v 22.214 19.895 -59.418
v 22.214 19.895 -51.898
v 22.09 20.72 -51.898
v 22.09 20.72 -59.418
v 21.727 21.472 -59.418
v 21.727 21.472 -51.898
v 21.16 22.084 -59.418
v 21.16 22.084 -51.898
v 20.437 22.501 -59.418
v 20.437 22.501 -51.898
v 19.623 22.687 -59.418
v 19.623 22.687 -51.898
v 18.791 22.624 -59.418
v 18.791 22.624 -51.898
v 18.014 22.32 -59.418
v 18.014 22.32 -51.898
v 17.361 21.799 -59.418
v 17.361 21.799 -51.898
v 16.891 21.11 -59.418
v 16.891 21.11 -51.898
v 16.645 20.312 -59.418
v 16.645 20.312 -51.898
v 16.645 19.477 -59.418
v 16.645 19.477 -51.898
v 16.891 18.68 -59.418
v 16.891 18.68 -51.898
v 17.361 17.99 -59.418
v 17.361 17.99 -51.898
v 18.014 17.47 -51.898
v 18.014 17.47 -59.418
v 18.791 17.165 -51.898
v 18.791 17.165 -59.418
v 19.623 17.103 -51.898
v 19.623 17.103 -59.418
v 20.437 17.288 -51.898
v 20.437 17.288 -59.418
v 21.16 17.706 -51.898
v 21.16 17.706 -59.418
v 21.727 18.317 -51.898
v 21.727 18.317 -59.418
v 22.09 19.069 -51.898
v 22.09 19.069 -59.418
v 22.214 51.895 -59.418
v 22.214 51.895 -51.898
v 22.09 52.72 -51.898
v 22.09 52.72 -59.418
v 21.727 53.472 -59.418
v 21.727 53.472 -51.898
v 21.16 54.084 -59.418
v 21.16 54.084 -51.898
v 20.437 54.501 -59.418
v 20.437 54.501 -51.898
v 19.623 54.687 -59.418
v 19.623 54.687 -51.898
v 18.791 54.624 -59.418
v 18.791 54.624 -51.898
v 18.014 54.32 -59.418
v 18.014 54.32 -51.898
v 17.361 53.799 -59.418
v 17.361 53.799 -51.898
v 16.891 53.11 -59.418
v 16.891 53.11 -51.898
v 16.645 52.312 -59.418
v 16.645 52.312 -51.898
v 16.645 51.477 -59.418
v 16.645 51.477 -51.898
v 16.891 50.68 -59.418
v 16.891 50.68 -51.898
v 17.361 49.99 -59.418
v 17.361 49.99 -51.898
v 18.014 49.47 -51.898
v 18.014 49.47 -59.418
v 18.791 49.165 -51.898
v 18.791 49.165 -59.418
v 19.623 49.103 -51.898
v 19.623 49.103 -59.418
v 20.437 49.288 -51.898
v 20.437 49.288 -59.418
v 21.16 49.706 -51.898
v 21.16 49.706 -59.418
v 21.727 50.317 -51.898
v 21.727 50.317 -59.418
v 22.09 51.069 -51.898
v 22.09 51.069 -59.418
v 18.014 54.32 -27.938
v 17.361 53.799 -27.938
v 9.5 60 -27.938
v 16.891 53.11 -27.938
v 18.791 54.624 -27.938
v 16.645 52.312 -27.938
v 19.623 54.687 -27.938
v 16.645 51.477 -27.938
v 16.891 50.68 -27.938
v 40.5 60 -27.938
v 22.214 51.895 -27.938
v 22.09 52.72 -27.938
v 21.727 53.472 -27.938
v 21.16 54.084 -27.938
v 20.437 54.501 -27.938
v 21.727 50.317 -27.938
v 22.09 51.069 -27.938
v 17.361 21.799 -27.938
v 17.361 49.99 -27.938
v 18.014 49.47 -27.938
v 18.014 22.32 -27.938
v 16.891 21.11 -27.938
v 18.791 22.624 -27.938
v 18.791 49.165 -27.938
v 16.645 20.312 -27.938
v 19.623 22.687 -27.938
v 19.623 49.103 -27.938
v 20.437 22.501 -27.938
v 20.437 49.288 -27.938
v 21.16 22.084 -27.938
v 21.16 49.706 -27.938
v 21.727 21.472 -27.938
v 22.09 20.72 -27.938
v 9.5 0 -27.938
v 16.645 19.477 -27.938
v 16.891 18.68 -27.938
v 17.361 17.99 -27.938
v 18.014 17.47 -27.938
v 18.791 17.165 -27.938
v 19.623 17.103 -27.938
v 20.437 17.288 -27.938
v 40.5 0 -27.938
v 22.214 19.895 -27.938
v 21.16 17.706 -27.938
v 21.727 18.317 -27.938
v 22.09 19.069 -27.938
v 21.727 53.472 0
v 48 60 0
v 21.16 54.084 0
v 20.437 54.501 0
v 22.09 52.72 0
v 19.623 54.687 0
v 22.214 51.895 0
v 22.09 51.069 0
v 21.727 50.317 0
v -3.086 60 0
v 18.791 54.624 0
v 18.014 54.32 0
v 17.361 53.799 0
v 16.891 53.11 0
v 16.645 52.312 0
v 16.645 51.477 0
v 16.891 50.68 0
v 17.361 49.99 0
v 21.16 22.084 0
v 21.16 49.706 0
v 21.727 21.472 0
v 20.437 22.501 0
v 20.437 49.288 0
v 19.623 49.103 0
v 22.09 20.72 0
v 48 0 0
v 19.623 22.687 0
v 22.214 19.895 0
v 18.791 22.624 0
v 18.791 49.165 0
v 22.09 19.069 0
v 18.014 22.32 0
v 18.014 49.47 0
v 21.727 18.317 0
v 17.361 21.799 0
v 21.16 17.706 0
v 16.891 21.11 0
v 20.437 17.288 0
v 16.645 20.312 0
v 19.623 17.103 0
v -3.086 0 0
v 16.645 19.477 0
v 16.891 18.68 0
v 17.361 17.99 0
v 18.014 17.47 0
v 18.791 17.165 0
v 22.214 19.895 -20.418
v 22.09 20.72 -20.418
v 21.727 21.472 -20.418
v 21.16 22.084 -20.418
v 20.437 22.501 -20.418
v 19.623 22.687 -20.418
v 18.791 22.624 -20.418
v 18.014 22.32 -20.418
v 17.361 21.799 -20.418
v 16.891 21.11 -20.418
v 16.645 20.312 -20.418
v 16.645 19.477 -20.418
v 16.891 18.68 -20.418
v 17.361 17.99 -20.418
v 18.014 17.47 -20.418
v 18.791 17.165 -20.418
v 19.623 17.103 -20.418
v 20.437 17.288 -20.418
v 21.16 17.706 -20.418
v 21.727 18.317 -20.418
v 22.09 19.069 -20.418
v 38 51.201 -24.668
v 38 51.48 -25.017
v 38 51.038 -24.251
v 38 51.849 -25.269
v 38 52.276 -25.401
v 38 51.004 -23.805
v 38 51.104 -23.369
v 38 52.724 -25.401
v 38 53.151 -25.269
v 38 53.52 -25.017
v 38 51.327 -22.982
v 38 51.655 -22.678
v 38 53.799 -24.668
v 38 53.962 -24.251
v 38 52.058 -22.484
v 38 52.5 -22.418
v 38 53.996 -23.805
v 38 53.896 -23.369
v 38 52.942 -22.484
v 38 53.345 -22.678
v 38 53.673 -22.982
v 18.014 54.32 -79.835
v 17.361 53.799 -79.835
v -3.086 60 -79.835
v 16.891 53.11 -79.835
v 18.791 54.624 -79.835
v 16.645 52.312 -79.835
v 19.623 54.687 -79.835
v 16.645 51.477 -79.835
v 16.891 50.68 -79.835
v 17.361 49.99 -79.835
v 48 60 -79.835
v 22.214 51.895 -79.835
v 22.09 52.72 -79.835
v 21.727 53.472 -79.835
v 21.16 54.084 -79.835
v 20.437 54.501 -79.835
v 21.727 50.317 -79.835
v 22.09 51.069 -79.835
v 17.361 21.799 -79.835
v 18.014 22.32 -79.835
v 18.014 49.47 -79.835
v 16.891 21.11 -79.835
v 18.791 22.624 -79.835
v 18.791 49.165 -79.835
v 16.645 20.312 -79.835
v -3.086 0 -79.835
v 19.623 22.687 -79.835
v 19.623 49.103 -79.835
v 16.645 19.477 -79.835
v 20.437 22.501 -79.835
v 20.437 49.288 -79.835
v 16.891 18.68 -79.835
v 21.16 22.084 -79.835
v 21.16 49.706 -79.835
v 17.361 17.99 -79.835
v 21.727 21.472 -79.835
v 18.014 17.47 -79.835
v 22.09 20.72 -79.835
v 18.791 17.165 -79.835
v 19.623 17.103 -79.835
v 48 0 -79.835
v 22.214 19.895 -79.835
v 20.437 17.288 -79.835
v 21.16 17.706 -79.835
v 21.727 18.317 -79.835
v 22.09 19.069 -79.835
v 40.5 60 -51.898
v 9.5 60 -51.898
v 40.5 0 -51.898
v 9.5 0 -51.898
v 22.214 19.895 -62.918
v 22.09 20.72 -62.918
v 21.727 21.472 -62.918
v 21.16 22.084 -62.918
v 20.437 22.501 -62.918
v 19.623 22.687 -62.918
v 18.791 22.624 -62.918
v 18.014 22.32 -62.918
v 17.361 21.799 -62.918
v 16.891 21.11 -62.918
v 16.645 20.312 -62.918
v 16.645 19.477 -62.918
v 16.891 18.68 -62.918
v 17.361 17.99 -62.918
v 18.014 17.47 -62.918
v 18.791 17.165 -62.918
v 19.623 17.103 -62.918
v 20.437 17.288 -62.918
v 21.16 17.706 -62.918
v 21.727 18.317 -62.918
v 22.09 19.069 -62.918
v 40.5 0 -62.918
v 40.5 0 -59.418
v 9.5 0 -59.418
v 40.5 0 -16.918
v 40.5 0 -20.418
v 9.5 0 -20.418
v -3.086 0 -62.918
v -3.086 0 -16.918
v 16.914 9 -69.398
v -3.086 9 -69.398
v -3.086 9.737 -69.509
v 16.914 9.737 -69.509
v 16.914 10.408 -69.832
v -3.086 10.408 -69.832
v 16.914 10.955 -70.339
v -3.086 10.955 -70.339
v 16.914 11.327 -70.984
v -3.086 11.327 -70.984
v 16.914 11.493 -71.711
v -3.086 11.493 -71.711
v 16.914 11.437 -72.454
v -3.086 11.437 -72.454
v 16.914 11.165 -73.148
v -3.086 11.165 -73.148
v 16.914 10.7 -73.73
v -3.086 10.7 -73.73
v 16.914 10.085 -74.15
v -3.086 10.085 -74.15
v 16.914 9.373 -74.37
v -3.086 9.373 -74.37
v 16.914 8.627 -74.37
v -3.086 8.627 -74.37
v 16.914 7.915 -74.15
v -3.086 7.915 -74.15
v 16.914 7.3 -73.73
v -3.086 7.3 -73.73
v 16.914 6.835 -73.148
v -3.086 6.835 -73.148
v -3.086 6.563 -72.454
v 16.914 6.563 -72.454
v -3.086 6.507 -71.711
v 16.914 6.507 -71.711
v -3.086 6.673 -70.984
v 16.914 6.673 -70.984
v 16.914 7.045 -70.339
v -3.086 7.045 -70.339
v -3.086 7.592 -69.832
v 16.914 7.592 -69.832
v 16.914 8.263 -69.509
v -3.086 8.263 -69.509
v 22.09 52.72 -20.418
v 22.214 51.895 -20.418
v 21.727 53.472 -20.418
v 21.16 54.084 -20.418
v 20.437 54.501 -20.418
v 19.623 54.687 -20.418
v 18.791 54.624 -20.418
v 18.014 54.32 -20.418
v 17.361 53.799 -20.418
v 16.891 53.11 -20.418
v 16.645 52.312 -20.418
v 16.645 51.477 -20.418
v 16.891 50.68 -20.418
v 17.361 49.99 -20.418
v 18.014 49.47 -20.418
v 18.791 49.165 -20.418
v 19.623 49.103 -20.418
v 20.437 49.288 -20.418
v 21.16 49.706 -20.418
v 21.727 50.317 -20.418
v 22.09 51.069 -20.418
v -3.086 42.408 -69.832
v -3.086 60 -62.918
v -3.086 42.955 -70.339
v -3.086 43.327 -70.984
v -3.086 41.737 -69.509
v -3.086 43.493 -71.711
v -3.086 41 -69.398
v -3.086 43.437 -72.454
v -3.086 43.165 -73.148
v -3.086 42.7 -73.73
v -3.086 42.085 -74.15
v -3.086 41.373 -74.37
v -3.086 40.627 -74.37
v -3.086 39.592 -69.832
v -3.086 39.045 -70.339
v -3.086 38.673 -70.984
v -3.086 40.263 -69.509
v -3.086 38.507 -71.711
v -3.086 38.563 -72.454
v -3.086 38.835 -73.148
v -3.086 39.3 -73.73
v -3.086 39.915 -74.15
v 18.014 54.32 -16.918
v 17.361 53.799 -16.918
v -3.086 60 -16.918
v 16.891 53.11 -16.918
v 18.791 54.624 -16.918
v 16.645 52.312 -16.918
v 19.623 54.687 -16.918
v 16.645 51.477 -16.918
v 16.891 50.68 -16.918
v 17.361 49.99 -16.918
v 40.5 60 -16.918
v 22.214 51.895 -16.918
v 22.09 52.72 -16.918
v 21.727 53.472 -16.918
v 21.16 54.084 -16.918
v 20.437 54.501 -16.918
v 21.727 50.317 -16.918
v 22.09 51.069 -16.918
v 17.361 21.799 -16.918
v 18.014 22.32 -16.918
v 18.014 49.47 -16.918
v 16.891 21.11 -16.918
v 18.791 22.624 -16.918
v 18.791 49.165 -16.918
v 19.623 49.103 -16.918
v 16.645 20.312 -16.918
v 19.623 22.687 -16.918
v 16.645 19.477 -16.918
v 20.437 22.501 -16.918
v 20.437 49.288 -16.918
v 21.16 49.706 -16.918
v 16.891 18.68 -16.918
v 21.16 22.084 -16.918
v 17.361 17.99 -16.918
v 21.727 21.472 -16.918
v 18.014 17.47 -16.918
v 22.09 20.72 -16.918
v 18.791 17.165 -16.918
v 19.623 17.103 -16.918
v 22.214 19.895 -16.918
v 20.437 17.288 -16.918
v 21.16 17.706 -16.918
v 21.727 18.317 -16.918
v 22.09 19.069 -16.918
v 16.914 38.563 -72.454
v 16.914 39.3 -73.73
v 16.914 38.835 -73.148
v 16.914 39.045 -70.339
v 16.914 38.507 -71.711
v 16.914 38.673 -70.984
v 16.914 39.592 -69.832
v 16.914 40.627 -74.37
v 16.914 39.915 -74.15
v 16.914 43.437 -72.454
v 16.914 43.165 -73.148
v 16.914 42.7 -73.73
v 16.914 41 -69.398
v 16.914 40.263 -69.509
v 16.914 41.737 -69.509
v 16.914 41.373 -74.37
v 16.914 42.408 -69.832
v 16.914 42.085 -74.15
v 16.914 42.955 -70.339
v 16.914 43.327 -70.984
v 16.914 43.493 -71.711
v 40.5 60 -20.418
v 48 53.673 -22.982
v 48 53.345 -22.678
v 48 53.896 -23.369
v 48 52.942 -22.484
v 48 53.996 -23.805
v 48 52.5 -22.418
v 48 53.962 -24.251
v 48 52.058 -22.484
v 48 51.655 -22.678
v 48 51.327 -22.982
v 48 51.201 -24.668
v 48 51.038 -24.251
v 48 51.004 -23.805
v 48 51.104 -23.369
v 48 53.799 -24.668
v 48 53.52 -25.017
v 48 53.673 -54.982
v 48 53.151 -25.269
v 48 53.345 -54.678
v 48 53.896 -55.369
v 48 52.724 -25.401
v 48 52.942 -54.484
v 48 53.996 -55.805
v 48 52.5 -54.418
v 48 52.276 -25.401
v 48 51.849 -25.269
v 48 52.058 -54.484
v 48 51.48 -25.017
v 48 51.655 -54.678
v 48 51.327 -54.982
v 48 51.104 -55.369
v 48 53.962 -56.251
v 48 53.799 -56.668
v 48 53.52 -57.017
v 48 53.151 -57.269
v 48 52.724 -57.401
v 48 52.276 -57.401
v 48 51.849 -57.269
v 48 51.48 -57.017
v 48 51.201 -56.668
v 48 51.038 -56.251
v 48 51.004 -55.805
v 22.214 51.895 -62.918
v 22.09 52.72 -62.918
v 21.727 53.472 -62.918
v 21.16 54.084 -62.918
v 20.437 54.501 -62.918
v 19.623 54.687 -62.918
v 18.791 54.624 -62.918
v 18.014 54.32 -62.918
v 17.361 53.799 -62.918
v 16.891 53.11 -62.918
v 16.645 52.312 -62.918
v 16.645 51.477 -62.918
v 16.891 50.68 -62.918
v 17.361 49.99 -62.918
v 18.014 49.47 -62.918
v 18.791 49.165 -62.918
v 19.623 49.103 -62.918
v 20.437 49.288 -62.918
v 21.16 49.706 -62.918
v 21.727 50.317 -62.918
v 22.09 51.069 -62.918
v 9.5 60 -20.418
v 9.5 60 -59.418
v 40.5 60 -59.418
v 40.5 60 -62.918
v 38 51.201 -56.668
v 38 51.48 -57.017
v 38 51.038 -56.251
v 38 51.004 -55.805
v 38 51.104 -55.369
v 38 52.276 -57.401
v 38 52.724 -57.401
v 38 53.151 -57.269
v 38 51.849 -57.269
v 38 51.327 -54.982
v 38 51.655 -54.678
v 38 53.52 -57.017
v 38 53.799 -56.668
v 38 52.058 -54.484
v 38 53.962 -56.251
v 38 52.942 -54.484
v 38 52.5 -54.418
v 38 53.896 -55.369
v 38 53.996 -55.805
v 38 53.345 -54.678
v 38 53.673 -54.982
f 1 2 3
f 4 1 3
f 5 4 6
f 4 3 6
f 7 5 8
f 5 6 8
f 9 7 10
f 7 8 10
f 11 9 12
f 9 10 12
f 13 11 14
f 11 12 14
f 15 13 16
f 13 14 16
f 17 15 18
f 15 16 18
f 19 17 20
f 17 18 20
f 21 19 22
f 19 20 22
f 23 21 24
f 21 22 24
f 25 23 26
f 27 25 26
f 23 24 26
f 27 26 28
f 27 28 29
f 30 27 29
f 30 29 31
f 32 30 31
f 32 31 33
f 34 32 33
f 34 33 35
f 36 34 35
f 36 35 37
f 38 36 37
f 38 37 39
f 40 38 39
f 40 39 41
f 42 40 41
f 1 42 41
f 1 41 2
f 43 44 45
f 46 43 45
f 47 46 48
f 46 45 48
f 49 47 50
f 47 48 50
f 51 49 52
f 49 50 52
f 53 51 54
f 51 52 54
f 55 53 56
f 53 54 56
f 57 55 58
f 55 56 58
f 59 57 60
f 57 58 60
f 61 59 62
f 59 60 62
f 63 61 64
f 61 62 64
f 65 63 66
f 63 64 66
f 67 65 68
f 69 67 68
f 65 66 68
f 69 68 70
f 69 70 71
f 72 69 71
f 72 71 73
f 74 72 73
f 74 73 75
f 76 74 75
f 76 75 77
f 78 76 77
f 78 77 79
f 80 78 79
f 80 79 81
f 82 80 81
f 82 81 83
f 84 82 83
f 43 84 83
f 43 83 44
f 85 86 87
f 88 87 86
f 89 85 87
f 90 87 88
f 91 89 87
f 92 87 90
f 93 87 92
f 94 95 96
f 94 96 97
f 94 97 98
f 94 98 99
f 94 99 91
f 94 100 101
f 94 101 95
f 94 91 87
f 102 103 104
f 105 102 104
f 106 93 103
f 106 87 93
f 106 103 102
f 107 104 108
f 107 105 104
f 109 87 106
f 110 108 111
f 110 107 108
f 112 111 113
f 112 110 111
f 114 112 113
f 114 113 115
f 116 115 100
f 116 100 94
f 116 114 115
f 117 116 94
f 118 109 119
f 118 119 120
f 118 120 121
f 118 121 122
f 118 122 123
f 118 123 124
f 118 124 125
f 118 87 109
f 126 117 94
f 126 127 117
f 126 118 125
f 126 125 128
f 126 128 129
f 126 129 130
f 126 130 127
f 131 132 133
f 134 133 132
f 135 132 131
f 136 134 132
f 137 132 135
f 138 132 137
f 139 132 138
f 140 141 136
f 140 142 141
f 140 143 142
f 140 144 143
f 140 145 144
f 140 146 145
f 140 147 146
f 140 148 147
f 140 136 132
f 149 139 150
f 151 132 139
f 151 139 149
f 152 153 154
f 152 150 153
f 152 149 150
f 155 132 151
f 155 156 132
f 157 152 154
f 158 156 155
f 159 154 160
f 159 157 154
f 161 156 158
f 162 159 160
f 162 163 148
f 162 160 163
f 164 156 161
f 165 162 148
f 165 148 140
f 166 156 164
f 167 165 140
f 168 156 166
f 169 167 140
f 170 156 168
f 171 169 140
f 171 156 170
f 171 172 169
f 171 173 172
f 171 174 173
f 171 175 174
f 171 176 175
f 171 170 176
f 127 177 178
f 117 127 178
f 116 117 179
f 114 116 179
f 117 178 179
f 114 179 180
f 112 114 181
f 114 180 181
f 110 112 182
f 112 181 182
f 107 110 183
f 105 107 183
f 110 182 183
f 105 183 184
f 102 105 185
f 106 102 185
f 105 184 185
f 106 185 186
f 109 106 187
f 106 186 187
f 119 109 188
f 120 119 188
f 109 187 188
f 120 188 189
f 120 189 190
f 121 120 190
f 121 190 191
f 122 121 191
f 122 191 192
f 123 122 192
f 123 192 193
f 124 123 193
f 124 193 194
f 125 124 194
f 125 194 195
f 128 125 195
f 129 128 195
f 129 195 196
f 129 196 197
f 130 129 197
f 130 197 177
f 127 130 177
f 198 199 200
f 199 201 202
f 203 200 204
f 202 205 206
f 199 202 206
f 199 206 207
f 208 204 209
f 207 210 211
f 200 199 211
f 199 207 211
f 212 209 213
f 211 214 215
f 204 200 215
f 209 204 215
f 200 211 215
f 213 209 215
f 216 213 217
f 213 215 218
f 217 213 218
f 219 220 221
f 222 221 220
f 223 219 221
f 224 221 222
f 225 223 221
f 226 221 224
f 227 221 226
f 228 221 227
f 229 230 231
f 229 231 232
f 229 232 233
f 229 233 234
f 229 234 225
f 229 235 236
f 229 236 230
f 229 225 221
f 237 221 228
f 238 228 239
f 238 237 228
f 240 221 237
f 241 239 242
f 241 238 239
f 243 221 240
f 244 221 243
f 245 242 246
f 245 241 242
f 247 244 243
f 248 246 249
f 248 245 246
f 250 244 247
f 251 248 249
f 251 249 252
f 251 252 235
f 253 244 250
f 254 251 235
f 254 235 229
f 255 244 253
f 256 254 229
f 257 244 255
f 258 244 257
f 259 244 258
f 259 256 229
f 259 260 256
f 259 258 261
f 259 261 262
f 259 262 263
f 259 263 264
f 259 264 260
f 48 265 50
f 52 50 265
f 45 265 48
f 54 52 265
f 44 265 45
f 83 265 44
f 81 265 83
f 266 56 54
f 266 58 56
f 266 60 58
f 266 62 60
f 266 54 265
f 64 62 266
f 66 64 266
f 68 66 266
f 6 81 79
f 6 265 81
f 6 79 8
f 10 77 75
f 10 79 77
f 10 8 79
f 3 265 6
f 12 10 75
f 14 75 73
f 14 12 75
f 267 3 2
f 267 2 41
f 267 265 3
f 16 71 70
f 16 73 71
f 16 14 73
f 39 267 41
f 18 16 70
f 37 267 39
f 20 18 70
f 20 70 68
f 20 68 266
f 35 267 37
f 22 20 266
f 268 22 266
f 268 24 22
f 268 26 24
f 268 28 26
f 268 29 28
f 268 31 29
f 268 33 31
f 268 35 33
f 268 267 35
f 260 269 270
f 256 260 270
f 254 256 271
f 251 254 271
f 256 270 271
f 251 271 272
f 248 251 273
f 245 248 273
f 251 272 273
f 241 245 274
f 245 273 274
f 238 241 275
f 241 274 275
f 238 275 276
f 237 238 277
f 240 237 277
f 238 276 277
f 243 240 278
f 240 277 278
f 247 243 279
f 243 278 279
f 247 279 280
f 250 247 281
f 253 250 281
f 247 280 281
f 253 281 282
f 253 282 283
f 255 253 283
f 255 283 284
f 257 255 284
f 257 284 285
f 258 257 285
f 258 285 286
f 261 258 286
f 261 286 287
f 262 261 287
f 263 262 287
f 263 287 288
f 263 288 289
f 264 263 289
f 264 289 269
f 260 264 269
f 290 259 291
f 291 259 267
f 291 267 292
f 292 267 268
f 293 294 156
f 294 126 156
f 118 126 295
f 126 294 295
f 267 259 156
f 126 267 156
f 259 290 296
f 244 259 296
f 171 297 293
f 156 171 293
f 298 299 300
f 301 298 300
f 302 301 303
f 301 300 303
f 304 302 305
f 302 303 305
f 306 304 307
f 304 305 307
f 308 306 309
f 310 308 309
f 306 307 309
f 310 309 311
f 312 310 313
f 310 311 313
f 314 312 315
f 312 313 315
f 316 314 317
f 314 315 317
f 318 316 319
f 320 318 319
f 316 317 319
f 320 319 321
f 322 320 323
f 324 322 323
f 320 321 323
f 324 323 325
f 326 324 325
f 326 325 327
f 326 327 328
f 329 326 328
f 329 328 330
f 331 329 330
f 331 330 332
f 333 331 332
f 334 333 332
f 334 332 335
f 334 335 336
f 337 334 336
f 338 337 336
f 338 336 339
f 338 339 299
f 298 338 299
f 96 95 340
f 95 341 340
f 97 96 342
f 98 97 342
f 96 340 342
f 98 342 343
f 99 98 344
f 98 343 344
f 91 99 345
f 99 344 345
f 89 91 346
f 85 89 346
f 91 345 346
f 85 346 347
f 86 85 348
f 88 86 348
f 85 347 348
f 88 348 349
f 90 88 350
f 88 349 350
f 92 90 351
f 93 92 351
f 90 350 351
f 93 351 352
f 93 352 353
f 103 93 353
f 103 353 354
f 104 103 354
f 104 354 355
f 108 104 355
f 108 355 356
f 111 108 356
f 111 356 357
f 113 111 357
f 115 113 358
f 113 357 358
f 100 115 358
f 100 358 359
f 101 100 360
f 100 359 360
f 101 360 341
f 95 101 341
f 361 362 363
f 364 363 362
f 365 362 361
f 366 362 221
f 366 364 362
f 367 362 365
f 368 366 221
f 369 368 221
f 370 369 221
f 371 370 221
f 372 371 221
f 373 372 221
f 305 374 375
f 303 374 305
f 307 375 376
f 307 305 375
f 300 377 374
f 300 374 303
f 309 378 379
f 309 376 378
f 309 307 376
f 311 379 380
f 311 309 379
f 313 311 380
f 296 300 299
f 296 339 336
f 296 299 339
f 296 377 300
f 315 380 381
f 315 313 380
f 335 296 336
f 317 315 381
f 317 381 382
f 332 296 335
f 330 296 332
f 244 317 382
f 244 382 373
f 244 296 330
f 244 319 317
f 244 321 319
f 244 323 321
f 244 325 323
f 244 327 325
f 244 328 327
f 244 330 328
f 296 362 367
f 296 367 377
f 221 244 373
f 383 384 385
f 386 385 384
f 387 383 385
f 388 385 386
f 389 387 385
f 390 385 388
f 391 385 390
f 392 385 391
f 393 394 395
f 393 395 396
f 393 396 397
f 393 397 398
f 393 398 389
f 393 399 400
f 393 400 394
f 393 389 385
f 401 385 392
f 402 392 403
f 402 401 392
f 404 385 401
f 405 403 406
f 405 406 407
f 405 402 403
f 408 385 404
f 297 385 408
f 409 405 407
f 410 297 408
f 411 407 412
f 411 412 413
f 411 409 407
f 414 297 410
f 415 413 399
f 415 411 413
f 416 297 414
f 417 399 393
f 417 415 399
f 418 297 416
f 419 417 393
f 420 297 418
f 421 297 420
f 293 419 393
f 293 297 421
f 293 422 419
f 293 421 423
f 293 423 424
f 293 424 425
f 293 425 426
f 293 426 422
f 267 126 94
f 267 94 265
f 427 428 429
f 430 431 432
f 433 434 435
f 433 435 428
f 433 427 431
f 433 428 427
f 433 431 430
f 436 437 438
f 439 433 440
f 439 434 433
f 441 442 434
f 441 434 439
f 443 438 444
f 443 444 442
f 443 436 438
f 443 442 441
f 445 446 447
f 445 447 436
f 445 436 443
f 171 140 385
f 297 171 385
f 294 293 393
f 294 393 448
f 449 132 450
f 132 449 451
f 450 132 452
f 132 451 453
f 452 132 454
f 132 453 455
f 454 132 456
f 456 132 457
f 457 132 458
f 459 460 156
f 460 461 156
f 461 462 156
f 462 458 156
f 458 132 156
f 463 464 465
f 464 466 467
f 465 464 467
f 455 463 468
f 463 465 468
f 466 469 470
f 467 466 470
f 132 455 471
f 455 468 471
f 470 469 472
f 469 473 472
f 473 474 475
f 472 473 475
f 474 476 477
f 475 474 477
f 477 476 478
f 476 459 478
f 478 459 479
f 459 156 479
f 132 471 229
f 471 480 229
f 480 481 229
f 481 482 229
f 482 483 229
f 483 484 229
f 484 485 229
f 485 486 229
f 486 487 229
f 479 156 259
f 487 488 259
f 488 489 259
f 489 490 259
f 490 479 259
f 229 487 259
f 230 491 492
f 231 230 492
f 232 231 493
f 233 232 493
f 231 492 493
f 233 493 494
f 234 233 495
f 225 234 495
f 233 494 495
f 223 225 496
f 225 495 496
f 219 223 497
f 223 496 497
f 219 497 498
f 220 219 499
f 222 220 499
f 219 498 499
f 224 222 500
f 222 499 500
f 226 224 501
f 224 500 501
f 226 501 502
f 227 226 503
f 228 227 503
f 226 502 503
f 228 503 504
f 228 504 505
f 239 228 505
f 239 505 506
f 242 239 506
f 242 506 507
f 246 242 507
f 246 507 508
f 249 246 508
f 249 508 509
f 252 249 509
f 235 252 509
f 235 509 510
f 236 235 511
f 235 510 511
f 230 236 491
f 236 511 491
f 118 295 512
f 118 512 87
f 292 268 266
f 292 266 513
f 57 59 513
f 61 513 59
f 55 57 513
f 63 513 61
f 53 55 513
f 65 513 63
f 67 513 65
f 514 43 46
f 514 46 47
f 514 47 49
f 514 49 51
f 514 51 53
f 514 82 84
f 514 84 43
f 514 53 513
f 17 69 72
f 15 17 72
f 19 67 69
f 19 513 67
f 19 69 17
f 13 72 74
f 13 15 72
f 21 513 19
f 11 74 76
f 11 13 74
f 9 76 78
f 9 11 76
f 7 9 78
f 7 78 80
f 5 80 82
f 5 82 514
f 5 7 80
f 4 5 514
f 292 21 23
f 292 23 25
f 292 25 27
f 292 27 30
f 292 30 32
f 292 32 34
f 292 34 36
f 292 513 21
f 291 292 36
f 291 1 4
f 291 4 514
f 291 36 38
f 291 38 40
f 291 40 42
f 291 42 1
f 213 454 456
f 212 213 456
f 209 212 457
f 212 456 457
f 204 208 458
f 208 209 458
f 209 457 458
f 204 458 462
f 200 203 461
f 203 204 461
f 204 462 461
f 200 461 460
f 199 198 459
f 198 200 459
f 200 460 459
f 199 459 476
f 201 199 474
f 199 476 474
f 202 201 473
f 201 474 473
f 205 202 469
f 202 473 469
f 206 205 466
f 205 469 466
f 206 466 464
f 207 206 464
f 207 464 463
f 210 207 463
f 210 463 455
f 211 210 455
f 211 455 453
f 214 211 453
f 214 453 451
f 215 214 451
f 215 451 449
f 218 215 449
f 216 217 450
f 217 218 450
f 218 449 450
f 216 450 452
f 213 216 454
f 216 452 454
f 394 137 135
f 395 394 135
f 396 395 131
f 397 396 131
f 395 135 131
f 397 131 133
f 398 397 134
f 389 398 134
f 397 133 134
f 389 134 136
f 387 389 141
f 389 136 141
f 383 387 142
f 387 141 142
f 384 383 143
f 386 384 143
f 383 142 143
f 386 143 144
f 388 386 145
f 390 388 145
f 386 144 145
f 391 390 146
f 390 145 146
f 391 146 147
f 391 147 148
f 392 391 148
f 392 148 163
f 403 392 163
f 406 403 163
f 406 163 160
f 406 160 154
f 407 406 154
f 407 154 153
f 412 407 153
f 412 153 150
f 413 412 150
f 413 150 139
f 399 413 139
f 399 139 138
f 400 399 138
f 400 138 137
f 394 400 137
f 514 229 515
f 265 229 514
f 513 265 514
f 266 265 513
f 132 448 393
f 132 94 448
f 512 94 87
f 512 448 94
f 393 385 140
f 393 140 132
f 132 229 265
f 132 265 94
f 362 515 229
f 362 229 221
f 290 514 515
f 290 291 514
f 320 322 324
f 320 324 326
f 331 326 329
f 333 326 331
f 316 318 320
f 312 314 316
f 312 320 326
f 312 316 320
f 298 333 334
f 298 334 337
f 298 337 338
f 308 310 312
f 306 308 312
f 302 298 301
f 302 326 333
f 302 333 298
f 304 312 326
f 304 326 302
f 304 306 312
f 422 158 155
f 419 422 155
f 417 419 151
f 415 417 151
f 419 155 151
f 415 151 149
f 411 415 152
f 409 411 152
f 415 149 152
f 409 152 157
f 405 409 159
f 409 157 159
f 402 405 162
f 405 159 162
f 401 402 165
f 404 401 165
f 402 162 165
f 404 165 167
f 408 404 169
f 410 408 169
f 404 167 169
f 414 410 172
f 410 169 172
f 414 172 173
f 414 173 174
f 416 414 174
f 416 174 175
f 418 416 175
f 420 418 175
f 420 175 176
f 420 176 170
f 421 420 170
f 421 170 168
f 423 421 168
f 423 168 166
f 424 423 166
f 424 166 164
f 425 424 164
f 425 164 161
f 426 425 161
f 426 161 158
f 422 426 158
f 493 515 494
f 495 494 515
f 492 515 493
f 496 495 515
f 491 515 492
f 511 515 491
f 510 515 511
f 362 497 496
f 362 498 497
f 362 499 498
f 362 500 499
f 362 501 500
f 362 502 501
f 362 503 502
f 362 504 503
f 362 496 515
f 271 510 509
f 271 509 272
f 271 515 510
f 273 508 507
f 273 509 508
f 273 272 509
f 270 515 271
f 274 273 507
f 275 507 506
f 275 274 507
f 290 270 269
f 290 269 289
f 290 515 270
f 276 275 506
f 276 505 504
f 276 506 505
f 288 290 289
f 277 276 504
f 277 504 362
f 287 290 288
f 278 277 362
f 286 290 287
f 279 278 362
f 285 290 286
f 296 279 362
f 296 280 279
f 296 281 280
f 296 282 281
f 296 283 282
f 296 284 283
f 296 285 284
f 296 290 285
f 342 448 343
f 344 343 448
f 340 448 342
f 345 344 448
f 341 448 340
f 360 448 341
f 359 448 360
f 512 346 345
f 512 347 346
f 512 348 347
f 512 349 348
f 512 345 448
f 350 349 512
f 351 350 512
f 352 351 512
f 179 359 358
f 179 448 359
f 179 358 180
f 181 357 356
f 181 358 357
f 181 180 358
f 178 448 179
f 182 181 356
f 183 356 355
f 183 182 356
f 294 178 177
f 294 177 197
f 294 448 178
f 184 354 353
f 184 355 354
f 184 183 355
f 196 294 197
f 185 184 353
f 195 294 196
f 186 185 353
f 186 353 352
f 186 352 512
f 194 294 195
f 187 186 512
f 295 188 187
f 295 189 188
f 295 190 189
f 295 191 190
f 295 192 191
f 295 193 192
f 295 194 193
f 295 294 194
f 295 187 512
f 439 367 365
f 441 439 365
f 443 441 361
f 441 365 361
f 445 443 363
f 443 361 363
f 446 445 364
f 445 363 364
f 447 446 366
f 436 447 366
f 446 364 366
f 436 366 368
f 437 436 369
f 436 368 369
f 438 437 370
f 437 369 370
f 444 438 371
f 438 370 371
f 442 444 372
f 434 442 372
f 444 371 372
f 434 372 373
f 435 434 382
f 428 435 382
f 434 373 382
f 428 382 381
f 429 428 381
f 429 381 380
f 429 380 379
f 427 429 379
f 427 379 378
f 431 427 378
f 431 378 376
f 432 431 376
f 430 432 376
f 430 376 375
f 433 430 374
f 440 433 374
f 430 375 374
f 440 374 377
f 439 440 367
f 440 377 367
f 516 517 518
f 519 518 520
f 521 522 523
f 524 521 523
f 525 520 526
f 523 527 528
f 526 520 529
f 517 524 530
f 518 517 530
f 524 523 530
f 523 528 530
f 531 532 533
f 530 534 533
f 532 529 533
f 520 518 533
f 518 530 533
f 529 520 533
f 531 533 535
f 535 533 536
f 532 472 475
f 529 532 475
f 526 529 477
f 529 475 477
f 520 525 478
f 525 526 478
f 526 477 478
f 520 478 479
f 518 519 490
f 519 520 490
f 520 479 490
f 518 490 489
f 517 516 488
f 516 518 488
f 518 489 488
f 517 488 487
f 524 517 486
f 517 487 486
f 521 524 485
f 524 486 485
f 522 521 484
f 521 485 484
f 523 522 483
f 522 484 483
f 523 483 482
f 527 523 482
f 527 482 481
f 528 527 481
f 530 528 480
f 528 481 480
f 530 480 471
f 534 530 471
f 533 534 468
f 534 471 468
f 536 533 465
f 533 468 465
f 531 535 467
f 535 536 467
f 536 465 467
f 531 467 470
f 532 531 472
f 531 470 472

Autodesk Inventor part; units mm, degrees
ref_plane "YZ Plane" through (0, 0, 0) normal (1, 0, 0) x (0, 1, 0)
ref_plane "XZ Plane" through (0, 0, 0) normal (0, 1, 0) x (-1, 0, 0)
ref_plane "XY Plane" through (0, 0, 0) normal (0, 0, 1) x (1, 0, 0)
sketch "Sketch2" plane through (0, 0, 0) normal (0, 1, 0) x (-1, 0, 0)
  line L0 (0, 0) -> (-48, 0)
  line L1 (-48, 0) -> (-48, -79.835)
  line L2 (-48, -79.835) -> (0, -79.835)
  line L3 (-40, -59.9175) -> (-9, -59.9175)
  line L4 (-9, -59.9175) -> (-9, -19.9175)
  line L5 (-9, -19.9175) -> (-40, -19.9175)
  line L6 (-33.9858, -17.4175) -> (3.086, -17.4175)
  line L7 (3.086, -62.4175) -> (-40, -62.4175)
  line L8 (-48, -6) -> (-48, -3.5)
  line L9 (-33.9858, -17.4175) -> (-40, -17.4175)
  line L10 (-40, -62.4175) -> (-40, -59.9175)
  line L11 (-40, -19.9175) -> (-40, -17.4175)
  line L12 (3.086, -16.9175) -> (-40.5, -16.9175)
  line L13 (-40.5, -16.9175) -> (-40.5, -20.4175)
  line L14 (-40.5, -20.4175) -> (-9.5, -20.4175)
  line L15 (-9.5, -20.4175) -> (-9.5, -59.4175)
  line L16 (-9.5, -59.4175) -> (-40.5, -59.4175)
  line L17 (-40.5, -59.4175) -> (-40.5, -62.9175)
  line L18 (-40.5, -62.9175) -> (3.086, -62.9175)
  line L19 (5, -12.8942) -> (5, -16.38) projected
  line L20 (0, 0) -> (3.086, 0)
  line L21 (3.086, 0) -> (3.086, -79.835)
  line L22 (3.086, -79.835) -> (0, -79.835)
  line L23 (3.086, -62.9175) -> (3.086, -62.4175)
  line L24 (3.086, -17.4175) -> (3.086, -16.9175)
  line L25 (3.086, -62.9175) -> (3.086, -62.4175)
  line L26 (3.086, -17.4175) -> (3.086, -16.9175)
  line L27 (-9.5, -27.9375) -> (-40.5, -27.9375)
  line L28 (-40.5, -27.9375) -> (-40.5, -51.8975)
  line L29 (-40.5, -51.8975) -> (-9.5, -51.8975)
  line L30 (-9.5, -51.8975) -> (-9.5, -27.9375)
  point P0 (-9.7436, -6)
  point P1 (0, -79.835)
  point P2 (-9.5, -51.8975)
  dimension "d19" = 79.835
  dimension "d20" = 45
  dimension "d21" = 17.4175
  dimension "d22" = 2.5
  dimension "d23" = 40
  dimension "d24" = 39
  dimension "d26" = 0.5
  dimension "d32" = 7.52
  dimension "d33" = 7.52
  dimension "d34" = 23.96
  dimension "d35" = 51.086
extrude "Extrusion7" add sketch "Sketch2" along normal blind 60 contours L20 L21 L12 L13 L14 L15 L27 L28 L29 L16 L17 L18 L22 L2 L1 L0
sketch "Sketch3" plane through (-3.086, 0, 0) normal (0, 0, 1) x (1, 0, 0)
  circle A0 centre (22.5, 51.8947) radius 2.8 projected
  circle A1 centre (22.5, 19.8947) radius 2.8 projected
  point P0 (3.086, 0)
  dimension "d38" = 32
extrude "Extrusion8" cut sketch "Sketch3" against normal through all
sketch "Sketch4" plane through (-3.086, 0, -79.835) normal (-1, 0, 0) x (0, 0, 1)
  circle A0 centre (7.9375, 41) radius 2.5
  circle A1 centre (7.9375, 9) radius 2.5
  line L0 (0, 0) -> (16.9175, 0) projected
  circle A2 centre (55.9175, 52.5) radius 1.5
  circle A3 centre (23.9175, 52.5) radius 1.5
  point P0 (79.835, 0)
  dimension "d36" = 5
  dimension "d37" = 5
  dimension "d39" = 32
  dimension "d40" = 9
  dimension "d43" = 3
extrude "Extrusion9" cut sketch "Sketch4" against normal blind 20 contours A0 | A1
extrude "Extrusion10" cut sketch "Sketch4" along normal blind 10 from surface at -51.086 contours A2 | A3
equation "\"d21\" = -0.5 * d20 + 0.5 * d19"
equation "\"d33\" = d32"
properties part number "Intake Mounting Block"
